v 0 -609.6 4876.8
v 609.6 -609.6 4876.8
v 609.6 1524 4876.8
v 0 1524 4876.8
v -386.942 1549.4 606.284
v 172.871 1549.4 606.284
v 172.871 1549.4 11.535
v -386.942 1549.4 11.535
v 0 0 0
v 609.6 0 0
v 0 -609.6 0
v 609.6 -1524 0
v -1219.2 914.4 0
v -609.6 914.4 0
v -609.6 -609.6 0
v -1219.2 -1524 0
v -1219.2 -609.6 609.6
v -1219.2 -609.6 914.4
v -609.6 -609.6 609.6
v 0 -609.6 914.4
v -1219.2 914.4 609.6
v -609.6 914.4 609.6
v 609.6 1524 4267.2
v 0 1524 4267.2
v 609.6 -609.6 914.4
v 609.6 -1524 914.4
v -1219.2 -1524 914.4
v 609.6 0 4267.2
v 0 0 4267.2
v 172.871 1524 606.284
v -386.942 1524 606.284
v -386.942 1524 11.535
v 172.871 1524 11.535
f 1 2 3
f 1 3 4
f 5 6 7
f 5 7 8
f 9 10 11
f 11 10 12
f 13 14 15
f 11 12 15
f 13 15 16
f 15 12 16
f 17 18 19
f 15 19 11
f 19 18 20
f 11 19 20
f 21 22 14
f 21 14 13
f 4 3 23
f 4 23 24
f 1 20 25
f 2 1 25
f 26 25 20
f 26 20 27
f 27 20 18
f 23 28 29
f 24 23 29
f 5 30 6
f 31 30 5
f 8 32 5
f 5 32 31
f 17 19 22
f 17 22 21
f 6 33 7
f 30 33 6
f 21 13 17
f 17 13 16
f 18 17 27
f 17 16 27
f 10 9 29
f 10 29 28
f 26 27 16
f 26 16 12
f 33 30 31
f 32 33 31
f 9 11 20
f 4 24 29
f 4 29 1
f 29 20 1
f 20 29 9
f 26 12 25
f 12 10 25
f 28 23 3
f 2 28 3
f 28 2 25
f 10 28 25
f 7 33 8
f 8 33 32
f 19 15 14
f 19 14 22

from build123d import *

# Parameters (mm, degrees)
F0_W     = 609.6
F0_H     = 609.6
F1_DEPTH = 4876.8
F2_W     = 609.6
F2_H     = 609.6
F3_DEPTH = 1524
F4_W     = 1219.2
F4_H     = 914.4
F4_W_2   = 609.6
F5_DEPTH = 914.4
F6_W     = 559.813217
F6_H     = 594.749077
F7_DEPTH = 25.4
F8_W     = 609.6
F8_H     = 609.6
F9_DEPTH = 1524


with BuildPart() as f1:
    # F0 (on Top) → F1 (new body)
    with BuildSketch(Plane.XY):
        with Locations((304.8, -304.8)):
            Rectangle(F0_W, F0_H)
    extrude(amount=F1_DEPTH)

    # F2 (on face) → F3 (join)
    with BuildSketch(Plane(origin=(0, 0, 0), x_dir=(-1, 0, 0), z_dir=(0, 1, 0))):
        with Locations((-304.8, 4572)):
            Rectangle(F2_W, F2_H)
    extrude(amount=F3_DEPTH)

    # F4 (on face) → F5 (join)
    with BuildSketch(Plane.XZ.offset(609.6)):
        with Locations((-609.6, 457.2)):
            Rectangle(F4_W, F4_H)
        with Locations((304.8, 457.2)):
            Rectangle(F4_W_2, F4_H)
    extrude(amount=F5_DEPTH)

    # F8 (on face) → F9 (join)
    with BuildSketch(Plane(origin=(0, -609.6, 0), x_dir=(-1, 0, 0), z_dir=(0, 1, 0))):
        with Locations((914.4, 304.8)):
            Rectangle(F8_W, F8_H)
    extrude(amount=F9_DEPTH)


with BuildPart() as f7:
    # F6 (on face) → F7 (new body)
    with BuildSketch(Plane(origin=(0, 1524, 0), x_dir=(-1, 0, 0), z_dir=(0, 1, 0))):
        with Locations((107.03545, 308.909066)):
            Rectangle(F6_W, F6_H)
    extrude(amount=F7_DEPTH)


solid = Compound([f1.part, f7.part])
